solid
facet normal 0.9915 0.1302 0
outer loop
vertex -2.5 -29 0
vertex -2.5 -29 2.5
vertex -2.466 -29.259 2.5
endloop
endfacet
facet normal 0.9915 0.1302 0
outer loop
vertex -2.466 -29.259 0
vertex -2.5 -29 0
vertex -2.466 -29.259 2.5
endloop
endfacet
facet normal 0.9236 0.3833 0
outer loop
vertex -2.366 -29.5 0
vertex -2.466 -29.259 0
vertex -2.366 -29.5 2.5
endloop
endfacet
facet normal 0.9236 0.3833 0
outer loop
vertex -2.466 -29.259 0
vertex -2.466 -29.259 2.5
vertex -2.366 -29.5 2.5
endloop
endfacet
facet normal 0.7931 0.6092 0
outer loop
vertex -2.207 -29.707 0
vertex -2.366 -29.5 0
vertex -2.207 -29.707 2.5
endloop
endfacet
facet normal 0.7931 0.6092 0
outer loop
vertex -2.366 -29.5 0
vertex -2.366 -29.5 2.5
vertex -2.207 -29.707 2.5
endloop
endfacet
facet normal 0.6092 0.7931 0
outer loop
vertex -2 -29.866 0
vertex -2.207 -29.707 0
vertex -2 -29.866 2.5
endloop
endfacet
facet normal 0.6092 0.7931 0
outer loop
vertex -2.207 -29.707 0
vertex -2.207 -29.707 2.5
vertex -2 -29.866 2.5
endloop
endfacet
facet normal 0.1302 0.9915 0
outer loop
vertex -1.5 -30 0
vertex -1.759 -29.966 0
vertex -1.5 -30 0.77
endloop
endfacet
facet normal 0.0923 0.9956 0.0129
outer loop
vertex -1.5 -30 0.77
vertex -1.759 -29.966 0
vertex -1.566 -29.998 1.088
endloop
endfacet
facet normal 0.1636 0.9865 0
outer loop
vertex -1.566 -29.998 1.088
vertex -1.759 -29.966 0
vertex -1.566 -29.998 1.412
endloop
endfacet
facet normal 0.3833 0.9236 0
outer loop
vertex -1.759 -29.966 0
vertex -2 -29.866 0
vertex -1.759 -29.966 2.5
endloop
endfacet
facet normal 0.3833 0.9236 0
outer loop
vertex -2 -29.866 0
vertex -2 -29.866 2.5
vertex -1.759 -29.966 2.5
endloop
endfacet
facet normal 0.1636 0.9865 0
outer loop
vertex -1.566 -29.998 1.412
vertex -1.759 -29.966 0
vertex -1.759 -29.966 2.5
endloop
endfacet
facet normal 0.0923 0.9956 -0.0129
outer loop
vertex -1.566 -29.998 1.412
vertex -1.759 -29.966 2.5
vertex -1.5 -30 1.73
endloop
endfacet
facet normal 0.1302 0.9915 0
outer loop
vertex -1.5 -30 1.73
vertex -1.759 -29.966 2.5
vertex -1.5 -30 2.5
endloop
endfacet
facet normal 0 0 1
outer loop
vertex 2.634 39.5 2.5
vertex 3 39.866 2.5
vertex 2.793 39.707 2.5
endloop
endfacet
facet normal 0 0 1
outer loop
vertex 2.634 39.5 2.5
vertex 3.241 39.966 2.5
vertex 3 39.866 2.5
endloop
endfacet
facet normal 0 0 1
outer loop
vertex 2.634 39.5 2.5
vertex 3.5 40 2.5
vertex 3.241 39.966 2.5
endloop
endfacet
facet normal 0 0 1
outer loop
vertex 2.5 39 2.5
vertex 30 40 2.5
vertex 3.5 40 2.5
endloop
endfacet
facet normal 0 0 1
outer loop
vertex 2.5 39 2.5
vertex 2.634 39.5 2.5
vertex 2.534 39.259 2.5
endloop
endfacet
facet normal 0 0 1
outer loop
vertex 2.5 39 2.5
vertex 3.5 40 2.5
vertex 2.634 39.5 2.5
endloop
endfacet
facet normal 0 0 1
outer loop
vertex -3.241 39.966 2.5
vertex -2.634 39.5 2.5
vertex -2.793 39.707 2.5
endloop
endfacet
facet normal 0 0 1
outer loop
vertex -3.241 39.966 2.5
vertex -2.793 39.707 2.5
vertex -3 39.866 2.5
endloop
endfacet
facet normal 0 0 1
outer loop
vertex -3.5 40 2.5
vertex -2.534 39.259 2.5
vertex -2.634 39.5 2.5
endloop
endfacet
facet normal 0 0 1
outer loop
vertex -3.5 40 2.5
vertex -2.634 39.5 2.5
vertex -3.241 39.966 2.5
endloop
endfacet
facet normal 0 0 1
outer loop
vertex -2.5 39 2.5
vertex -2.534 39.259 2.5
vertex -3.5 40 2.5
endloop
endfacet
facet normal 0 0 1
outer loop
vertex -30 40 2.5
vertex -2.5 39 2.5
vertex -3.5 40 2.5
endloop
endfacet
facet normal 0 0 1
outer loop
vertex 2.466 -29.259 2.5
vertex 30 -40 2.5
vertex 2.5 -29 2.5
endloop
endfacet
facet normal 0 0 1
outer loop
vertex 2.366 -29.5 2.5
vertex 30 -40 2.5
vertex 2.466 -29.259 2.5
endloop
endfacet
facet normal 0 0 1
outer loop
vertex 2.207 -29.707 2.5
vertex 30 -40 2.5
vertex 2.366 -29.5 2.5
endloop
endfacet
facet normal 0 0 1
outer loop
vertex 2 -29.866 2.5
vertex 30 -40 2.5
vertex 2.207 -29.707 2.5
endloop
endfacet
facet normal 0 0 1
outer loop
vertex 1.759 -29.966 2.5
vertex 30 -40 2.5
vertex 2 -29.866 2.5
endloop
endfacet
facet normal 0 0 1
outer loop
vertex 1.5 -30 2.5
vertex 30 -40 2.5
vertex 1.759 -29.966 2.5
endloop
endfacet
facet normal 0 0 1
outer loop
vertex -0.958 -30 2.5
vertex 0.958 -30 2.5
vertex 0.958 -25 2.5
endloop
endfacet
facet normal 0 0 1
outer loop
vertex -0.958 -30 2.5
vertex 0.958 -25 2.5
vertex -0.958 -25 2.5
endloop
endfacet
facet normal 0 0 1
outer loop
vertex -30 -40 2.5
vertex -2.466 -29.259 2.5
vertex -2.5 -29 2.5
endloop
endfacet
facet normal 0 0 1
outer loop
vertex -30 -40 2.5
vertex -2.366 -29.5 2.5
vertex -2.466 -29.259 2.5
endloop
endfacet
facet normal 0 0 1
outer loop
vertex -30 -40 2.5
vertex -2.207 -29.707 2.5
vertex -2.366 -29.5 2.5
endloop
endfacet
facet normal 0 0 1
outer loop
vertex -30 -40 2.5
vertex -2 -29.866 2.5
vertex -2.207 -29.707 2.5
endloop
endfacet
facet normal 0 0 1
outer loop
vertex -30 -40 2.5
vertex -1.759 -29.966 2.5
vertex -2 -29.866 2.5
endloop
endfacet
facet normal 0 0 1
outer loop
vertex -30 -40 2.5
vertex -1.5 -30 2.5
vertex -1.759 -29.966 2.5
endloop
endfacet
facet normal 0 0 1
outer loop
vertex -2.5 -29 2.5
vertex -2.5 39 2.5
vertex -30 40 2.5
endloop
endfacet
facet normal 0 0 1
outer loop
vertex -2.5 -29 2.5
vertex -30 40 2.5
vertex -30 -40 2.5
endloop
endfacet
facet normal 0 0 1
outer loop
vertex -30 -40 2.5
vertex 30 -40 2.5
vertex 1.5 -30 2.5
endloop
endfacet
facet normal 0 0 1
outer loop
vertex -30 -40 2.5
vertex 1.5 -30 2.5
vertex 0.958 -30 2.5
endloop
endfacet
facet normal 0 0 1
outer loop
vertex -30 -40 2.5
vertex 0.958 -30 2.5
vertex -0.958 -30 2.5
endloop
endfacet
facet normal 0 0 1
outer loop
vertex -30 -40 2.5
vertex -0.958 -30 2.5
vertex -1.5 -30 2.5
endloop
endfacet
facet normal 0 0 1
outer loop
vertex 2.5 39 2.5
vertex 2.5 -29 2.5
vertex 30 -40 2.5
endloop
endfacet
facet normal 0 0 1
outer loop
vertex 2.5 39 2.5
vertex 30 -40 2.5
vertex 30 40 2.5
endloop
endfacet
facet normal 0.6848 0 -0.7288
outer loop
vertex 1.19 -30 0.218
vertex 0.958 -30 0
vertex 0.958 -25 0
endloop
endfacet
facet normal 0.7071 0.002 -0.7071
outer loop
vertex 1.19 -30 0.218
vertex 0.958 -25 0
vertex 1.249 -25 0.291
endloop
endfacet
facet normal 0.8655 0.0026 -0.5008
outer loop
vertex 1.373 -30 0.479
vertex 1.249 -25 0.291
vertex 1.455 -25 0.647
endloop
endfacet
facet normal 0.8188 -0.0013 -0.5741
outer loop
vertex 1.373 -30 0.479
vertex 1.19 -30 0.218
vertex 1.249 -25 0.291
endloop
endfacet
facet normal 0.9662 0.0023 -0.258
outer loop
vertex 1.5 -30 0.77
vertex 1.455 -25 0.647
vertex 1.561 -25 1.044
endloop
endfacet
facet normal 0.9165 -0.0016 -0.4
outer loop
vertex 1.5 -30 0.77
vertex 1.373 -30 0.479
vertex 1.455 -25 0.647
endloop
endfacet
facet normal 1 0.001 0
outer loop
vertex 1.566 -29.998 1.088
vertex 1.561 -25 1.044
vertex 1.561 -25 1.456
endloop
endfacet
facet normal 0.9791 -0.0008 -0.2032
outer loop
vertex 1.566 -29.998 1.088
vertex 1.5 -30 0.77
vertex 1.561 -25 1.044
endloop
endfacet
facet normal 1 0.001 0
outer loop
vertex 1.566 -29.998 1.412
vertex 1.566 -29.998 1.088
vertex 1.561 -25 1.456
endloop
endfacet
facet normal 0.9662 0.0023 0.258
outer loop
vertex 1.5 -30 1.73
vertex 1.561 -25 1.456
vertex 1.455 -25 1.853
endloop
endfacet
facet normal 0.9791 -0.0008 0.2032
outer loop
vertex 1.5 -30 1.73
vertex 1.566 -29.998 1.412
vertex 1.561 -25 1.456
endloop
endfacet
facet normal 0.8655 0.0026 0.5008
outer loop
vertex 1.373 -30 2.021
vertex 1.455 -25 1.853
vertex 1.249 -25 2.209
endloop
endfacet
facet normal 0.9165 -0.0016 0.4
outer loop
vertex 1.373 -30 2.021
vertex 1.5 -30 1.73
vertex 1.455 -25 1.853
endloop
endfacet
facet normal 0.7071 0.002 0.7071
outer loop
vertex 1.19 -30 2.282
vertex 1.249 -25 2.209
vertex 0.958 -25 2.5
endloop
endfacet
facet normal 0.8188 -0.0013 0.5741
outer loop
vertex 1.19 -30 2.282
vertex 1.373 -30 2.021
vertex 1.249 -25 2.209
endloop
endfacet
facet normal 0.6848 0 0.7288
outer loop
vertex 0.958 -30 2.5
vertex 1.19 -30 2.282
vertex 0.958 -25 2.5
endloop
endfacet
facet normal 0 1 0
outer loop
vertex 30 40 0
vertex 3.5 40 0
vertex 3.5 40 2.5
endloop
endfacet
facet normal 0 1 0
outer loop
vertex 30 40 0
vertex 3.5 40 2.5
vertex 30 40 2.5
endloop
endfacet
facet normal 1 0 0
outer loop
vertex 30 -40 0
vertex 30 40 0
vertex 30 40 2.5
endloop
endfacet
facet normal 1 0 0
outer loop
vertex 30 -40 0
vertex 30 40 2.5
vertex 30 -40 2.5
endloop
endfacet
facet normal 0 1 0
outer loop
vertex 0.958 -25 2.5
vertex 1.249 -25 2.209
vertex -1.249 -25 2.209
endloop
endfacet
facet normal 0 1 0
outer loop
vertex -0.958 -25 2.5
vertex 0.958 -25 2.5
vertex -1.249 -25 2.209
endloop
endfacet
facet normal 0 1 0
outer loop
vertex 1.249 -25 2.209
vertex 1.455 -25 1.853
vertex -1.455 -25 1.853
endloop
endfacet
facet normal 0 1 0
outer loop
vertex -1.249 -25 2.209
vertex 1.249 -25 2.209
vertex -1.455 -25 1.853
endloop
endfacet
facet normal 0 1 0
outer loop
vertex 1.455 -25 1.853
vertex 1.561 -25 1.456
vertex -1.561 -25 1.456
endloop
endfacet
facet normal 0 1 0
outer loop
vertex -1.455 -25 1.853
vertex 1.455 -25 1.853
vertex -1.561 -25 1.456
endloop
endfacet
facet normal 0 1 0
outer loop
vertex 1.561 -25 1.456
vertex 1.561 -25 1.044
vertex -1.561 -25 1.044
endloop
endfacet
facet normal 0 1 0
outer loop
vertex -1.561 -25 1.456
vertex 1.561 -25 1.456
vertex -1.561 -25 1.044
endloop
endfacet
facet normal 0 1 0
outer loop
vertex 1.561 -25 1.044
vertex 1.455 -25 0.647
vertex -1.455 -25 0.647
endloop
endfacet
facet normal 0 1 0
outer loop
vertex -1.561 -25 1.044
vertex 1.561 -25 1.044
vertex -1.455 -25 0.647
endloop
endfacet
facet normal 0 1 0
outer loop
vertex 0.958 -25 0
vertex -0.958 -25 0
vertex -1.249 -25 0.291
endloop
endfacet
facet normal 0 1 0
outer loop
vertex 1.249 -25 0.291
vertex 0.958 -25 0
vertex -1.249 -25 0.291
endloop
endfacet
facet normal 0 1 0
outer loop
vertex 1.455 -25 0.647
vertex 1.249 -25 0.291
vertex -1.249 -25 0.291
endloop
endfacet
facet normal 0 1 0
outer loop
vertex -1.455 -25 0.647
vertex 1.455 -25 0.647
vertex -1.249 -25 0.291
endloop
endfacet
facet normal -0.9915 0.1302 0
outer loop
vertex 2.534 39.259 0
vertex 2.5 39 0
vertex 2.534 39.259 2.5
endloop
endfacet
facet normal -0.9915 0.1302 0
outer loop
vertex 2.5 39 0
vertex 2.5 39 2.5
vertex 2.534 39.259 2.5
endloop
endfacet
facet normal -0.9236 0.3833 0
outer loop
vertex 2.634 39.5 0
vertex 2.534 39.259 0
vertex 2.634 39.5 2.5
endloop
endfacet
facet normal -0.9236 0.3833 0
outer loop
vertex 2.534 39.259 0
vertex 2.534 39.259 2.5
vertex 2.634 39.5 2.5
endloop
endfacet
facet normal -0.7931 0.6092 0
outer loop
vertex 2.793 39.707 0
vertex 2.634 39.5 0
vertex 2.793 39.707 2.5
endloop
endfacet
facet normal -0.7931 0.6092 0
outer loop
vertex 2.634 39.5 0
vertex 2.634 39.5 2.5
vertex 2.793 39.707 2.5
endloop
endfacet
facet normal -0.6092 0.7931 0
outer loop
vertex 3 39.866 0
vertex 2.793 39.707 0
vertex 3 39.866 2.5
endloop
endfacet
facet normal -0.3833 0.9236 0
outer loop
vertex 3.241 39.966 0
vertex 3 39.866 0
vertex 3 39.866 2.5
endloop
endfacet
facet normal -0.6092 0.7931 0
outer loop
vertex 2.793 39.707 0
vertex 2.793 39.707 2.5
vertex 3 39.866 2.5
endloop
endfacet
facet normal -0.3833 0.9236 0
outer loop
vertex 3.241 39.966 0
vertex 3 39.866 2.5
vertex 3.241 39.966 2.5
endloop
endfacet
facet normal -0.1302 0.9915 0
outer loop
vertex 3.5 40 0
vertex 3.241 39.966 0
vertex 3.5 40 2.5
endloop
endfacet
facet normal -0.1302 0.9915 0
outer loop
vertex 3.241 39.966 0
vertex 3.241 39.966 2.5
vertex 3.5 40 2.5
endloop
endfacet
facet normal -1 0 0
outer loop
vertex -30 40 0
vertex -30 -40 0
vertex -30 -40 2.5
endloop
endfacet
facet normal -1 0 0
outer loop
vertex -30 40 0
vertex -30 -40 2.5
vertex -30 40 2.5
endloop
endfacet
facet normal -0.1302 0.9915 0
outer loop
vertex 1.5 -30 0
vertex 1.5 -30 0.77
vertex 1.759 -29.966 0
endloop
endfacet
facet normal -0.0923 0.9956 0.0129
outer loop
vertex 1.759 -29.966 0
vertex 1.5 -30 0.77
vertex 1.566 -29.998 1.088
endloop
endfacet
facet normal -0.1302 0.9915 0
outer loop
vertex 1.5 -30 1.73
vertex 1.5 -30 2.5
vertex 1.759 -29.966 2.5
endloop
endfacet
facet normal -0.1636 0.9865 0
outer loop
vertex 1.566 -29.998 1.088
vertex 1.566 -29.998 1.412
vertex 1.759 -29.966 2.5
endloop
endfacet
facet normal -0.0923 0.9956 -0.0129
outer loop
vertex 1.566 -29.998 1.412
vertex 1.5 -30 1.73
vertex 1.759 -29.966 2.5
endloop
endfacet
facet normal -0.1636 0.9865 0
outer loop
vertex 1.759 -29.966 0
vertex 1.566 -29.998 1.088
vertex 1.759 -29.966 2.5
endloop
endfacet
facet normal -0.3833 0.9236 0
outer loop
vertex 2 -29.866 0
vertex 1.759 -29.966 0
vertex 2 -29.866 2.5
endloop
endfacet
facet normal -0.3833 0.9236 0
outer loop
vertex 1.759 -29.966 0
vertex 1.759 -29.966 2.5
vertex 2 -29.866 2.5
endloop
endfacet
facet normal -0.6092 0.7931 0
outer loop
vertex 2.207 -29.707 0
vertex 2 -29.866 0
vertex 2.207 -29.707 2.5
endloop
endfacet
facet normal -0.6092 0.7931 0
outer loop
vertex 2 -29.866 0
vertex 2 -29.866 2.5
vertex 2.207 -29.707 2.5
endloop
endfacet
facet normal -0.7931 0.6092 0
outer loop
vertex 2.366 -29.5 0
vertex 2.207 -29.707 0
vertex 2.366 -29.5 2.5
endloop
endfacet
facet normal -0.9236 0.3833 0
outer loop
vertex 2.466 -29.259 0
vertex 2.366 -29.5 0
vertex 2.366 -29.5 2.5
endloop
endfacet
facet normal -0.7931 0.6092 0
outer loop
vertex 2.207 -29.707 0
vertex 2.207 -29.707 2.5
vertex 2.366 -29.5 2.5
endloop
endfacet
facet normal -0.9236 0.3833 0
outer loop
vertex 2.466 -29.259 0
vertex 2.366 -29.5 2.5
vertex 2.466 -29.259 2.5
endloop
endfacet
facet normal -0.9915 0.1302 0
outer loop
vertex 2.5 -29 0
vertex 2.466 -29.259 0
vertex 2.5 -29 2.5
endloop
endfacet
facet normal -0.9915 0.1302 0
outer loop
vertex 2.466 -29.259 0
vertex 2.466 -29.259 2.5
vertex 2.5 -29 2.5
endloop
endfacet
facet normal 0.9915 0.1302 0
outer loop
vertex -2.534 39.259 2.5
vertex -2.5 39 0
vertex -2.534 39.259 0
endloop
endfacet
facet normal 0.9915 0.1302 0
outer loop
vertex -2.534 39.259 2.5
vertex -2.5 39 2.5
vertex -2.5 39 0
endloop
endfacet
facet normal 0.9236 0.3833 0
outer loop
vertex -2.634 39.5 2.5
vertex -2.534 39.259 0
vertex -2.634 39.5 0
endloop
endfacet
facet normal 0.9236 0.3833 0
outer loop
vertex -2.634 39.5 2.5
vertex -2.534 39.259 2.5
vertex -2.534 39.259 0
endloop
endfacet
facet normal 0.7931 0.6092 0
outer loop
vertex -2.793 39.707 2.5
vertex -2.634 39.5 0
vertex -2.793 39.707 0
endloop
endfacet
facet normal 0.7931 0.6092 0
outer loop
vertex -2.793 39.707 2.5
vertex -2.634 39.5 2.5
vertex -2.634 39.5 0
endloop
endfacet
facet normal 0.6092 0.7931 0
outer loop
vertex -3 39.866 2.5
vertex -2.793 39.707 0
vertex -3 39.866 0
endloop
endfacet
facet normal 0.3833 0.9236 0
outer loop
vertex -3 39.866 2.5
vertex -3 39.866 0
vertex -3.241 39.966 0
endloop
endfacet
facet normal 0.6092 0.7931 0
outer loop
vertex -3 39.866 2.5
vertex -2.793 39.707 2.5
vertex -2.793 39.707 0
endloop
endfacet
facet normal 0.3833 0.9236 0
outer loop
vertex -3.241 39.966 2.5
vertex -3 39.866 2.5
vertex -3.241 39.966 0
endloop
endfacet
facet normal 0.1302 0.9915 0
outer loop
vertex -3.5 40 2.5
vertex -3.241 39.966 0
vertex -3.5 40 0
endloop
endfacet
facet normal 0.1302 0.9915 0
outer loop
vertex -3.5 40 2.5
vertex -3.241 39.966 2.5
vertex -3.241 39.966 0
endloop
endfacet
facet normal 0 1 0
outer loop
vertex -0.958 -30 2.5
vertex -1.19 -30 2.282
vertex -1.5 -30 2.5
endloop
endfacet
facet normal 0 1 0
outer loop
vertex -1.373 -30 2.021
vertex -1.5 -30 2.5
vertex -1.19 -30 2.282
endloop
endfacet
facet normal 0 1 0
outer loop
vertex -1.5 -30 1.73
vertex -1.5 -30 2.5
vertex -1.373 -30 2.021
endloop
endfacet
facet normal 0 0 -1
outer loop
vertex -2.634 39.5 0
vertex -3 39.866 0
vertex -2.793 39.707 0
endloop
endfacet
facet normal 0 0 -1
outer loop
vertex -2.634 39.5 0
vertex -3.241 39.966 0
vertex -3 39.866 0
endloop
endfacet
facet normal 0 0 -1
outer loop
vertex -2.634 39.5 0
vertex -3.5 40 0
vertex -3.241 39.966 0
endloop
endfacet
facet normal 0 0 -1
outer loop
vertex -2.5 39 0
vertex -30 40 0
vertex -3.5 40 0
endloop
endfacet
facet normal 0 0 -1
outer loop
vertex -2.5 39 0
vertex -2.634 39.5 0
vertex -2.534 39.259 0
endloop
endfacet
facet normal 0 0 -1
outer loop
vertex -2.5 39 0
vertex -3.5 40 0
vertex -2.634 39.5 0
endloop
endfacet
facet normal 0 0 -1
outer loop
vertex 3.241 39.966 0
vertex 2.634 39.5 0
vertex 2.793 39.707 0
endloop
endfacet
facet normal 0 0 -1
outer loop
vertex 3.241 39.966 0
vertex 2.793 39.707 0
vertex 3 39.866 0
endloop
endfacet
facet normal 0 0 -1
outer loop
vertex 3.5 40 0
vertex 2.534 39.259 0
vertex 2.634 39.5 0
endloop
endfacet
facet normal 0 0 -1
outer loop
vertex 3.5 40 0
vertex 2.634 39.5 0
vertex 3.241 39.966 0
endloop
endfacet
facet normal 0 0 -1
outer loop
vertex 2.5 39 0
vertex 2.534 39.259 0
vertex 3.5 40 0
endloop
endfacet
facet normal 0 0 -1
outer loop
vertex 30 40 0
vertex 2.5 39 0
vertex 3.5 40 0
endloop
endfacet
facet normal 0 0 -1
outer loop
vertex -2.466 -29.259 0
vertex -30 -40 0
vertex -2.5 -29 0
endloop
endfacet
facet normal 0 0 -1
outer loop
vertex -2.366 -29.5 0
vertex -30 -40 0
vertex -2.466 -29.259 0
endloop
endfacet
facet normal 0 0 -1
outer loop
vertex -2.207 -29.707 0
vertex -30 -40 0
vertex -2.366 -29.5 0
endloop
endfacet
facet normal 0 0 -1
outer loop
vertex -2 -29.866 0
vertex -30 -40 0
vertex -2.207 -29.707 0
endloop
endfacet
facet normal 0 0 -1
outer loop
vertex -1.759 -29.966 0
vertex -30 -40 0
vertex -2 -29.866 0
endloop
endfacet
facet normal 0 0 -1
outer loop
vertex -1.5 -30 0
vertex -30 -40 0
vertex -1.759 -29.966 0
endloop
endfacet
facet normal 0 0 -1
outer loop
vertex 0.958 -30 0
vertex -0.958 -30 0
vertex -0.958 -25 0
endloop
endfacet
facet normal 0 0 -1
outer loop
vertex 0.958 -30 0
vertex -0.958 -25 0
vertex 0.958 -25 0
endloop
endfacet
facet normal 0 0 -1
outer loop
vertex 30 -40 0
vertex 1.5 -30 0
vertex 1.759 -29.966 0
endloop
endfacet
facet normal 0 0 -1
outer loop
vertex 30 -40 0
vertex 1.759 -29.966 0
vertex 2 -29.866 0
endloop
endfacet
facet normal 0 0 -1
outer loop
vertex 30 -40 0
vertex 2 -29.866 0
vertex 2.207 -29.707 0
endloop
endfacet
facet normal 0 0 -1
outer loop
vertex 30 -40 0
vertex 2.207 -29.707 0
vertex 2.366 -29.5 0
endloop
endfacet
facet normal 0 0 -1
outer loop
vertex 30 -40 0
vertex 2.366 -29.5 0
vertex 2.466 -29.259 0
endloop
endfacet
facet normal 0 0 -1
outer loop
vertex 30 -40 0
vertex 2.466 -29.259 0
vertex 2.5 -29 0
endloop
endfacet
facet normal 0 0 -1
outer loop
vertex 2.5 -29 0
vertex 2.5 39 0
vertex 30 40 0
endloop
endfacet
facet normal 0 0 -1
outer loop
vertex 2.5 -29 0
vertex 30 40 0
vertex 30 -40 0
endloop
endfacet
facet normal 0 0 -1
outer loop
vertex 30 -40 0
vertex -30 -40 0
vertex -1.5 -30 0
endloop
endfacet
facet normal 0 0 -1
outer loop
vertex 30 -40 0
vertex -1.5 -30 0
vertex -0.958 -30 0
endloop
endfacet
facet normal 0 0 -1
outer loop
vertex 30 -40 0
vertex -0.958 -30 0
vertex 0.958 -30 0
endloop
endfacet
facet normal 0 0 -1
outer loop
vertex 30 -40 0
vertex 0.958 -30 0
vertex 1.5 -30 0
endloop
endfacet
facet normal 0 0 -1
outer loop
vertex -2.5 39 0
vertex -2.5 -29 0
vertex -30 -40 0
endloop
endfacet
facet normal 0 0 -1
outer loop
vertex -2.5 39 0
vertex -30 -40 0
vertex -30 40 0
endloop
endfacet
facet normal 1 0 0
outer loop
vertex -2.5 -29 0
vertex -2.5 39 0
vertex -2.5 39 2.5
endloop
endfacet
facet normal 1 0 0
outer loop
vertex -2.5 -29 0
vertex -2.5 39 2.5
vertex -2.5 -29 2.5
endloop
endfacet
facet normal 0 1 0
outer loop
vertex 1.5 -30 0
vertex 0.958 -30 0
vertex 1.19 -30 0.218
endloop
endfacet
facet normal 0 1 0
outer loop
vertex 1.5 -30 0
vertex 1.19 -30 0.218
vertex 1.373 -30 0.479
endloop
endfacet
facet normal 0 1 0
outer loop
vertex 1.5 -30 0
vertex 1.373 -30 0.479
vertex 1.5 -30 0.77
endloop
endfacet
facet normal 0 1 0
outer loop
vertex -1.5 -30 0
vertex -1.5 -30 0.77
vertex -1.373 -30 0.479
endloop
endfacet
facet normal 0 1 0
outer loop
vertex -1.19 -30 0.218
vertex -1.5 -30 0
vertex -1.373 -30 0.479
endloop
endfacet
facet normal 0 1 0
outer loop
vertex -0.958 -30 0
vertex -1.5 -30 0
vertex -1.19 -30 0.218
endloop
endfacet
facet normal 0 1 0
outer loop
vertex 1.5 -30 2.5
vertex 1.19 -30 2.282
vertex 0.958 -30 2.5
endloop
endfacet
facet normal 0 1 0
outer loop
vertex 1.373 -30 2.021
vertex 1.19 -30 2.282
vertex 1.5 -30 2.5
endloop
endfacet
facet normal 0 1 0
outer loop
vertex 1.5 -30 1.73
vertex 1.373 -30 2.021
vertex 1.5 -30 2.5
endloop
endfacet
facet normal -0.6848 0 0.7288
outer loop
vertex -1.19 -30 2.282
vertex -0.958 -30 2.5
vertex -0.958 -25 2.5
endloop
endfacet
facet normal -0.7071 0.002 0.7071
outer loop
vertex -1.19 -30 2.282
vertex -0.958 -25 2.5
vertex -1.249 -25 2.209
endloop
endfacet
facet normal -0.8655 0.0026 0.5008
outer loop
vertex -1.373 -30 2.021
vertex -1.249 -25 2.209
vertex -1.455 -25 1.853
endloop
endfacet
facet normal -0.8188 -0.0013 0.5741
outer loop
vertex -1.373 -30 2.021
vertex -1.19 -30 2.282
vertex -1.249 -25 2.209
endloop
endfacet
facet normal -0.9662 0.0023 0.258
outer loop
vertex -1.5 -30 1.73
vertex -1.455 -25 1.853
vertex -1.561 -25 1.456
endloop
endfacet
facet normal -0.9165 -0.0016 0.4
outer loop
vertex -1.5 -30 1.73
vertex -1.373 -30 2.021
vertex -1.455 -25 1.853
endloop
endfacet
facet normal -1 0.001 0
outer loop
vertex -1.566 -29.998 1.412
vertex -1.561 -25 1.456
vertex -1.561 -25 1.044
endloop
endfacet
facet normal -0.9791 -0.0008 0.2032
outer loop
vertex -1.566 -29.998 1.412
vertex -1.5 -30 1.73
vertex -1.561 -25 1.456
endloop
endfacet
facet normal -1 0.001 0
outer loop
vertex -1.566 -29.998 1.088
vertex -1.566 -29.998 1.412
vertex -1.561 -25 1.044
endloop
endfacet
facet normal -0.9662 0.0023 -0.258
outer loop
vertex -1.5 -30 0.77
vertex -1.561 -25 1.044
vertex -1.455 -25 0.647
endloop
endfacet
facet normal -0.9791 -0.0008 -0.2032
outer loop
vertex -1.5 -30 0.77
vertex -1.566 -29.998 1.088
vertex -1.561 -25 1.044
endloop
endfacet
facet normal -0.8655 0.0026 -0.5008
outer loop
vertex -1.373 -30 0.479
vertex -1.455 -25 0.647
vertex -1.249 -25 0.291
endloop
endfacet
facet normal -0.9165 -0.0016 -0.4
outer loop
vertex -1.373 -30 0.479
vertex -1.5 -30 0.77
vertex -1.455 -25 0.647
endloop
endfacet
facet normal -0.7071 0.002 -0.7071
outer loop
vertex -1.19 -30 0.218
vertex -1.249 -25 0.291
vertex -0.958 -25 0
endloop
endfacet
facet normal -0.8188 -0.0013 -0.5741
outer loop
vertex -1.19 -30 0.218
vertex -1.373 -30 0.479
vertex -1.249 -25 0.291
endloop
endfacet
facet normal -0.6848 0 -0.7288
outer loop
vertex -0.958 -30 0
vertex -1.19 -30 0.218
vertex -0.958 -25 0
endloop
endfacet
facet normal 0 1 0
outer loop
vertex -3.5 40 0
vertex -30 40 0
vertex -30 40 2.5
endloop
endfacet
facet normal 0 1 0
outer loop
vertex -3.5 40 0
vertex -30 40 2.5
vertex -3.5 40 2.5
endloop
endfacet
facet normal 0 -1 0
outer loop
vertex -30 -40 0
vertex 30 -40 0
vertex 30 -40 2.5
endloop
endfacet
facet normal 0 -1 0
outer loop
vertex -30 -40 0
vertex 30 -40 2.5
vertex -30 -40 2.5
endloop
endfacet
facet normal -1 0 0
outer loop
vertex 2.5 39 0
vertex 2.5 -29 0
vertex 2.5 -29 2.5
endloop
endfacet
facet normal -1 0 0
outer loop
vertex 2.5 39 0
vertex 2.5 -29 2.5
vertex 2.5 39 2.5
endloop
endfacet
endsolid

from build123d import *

# Parameters (mm, degrees)
BOSS_EXTRUDE1_DEPTH = 2.5
FILLET1_R           = 1
BOSS_EXTRUDE2_DEPTH = 5


with BuildPart() as part:
    # Sketch1 → Boss-Extrude1 (new body)
    with BuildSketch(Plane.XY):
        Polygon((-2.5, 40), (-2.5, -30), (2.5, -30), (2.5, 40), (30, 40), (30, -40), (-30, -40), (-30, 40), align=None)
    extrude(amount=BOSS_EXTRUDE1_DEPTH)

    # Fillet1
    fillet1_edges = [part.edges().sort_by_distance(p)[0] for p in [
        (-2.5, 40, 1.25),
        (-2.5, -30, 1.25),
        (2.5, -30, 1.25),
        (2.5, 40, 1.25),
    ]]
    fillet(fillet1_edges, radius=FILLET1_R)

    # Sketch2 → Boss-Extrude2 (add)
    with BuildSketch(Plane(origin=(0, -30, 0), x_dir=(1, 0, 0), z_dir=(0, 1, 0))):
        with BuildLine():
            Line((-0.957859614, 0), (0.957859614, 0))
            ThreePointArc((0.957859614, 0), (1.5748, -1.25), (0.957859614, -2.5))
            Line((0.957859614, -2.5), (-0.957859614, -2.5))
            ThreePointArc((-0.957859614, -2.5), (-1.5748, -1.25), (-0.957859614, 0))
        make_face()
    extrude(amount=BOSS_EXTRUDE2_DEPTH)


solid = part.part
